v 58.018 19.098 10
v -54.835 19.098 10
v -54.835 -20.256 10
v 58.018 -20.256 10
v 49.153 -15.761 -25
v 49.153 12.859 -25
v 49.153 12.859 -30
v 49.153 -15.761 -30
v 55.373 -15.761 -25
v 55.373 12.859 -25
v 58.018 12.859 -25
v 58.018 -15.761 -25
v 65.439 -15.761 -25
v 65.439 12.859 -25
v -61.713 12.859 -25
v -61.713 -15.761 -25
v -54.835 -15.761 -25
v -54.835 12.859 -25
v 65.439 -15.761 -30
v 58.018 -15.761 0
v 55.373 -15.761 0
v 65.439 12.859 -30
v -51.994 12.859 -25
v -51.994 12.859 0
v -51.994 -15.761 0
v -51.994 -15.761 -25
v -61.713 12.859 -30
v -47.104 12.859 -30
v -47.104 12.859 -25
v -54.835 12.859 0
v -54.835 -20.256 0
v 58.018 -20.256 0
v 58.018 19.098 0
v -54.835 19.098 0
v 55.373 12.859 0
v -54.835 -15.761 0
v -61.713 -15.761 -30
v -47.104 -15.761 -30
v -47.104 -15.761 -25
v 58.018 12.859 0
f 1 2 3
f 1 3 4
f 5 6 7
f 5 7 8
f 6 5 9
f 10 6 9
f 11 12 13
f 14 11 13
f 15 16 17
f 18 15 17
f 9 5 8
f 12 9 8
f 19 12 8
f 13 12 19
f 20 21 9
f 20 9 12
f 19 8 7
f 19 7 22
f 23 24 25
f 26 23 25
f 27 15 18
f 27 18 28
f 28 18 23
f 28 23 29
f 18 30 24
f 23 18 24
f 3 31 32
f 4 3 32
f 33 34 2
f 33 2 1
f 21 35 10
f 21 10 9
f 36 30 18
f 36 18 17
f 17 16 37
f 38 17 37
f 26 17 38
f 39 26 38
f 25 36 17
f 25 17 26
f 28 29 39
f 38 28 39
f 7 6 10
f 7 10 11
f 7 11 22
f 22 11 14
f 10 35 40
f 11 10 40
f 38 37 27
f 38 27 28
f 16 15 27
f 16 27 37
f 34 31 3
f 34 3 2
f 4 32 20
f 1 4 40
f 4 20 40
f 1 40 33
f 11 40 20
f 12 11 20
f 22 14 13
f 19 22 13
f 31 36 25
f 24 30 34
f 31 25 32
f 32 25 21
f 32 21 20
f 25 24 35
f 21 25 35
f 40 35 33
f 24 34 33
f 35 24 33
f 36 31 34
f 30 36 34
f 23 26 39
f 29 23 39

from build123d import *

# Parameters (mm, degrees)
F0_W     = 112.853165
F0_H     = 39.353924
F1_DEPTH = 10
F2_W     = 2.840738
F2_H     = 28.620001
F2_W_2   = 2.645086
F3_DEPTH = 25
F4_W     = 14.609244
F4_H     = 28.620001
F5_DEPTH = 5
F6_W     = 16.285717
F6_H     = 28.620001
F7_DEPTH = 5


with BuildPart() as f1:
    # F0 (on Top) → F1 (new body)
    with BuildSketch(Plane.XY):
        with Locations((1.59152, -0.578734)):
            Rectangle(F0_W, F0_H)
    extrude(amount=F1_DEPTH)

    # F2 (on face) → F3 (join)
    with BuildSketch(Plane(origin=(0, 0, 0), x_dir=(1, 0, 0), z_dir=(0, 0, -1))):
        with Locations((-53.414693, 1.450803)):
            Rectangle(F2_W, F2_H)
        with Locations((56.69556, 1.450803)):
            Rectangle(F2_W_2, F2_H)
    extrude(amount=F3_DEPTH)

    # F4 (on face) → F5 (join)
    with BuildSketch(Plane(origin=(0, 0, -25), x_dir=(1, 0, 0), z_dir=(0, 0, -1))):
        with Locations((-54.408634, 1.450803)):
            Rectangle(F4_W, F4_H)
    extrude(amount=F5_DEPTH)

    # F6 (on face) → F7 (join)
    with BuildSketch(Plane(origin=(0, 0, -25), x_dir=(1, 0, 0), z_dir=(0, 0, -1))):
        with Locations((57.296015, 1.450803)):
            Rectangle(F6_W, F6_H)
    extrude(amount=F7_DEPTH)


solid = f1.part
